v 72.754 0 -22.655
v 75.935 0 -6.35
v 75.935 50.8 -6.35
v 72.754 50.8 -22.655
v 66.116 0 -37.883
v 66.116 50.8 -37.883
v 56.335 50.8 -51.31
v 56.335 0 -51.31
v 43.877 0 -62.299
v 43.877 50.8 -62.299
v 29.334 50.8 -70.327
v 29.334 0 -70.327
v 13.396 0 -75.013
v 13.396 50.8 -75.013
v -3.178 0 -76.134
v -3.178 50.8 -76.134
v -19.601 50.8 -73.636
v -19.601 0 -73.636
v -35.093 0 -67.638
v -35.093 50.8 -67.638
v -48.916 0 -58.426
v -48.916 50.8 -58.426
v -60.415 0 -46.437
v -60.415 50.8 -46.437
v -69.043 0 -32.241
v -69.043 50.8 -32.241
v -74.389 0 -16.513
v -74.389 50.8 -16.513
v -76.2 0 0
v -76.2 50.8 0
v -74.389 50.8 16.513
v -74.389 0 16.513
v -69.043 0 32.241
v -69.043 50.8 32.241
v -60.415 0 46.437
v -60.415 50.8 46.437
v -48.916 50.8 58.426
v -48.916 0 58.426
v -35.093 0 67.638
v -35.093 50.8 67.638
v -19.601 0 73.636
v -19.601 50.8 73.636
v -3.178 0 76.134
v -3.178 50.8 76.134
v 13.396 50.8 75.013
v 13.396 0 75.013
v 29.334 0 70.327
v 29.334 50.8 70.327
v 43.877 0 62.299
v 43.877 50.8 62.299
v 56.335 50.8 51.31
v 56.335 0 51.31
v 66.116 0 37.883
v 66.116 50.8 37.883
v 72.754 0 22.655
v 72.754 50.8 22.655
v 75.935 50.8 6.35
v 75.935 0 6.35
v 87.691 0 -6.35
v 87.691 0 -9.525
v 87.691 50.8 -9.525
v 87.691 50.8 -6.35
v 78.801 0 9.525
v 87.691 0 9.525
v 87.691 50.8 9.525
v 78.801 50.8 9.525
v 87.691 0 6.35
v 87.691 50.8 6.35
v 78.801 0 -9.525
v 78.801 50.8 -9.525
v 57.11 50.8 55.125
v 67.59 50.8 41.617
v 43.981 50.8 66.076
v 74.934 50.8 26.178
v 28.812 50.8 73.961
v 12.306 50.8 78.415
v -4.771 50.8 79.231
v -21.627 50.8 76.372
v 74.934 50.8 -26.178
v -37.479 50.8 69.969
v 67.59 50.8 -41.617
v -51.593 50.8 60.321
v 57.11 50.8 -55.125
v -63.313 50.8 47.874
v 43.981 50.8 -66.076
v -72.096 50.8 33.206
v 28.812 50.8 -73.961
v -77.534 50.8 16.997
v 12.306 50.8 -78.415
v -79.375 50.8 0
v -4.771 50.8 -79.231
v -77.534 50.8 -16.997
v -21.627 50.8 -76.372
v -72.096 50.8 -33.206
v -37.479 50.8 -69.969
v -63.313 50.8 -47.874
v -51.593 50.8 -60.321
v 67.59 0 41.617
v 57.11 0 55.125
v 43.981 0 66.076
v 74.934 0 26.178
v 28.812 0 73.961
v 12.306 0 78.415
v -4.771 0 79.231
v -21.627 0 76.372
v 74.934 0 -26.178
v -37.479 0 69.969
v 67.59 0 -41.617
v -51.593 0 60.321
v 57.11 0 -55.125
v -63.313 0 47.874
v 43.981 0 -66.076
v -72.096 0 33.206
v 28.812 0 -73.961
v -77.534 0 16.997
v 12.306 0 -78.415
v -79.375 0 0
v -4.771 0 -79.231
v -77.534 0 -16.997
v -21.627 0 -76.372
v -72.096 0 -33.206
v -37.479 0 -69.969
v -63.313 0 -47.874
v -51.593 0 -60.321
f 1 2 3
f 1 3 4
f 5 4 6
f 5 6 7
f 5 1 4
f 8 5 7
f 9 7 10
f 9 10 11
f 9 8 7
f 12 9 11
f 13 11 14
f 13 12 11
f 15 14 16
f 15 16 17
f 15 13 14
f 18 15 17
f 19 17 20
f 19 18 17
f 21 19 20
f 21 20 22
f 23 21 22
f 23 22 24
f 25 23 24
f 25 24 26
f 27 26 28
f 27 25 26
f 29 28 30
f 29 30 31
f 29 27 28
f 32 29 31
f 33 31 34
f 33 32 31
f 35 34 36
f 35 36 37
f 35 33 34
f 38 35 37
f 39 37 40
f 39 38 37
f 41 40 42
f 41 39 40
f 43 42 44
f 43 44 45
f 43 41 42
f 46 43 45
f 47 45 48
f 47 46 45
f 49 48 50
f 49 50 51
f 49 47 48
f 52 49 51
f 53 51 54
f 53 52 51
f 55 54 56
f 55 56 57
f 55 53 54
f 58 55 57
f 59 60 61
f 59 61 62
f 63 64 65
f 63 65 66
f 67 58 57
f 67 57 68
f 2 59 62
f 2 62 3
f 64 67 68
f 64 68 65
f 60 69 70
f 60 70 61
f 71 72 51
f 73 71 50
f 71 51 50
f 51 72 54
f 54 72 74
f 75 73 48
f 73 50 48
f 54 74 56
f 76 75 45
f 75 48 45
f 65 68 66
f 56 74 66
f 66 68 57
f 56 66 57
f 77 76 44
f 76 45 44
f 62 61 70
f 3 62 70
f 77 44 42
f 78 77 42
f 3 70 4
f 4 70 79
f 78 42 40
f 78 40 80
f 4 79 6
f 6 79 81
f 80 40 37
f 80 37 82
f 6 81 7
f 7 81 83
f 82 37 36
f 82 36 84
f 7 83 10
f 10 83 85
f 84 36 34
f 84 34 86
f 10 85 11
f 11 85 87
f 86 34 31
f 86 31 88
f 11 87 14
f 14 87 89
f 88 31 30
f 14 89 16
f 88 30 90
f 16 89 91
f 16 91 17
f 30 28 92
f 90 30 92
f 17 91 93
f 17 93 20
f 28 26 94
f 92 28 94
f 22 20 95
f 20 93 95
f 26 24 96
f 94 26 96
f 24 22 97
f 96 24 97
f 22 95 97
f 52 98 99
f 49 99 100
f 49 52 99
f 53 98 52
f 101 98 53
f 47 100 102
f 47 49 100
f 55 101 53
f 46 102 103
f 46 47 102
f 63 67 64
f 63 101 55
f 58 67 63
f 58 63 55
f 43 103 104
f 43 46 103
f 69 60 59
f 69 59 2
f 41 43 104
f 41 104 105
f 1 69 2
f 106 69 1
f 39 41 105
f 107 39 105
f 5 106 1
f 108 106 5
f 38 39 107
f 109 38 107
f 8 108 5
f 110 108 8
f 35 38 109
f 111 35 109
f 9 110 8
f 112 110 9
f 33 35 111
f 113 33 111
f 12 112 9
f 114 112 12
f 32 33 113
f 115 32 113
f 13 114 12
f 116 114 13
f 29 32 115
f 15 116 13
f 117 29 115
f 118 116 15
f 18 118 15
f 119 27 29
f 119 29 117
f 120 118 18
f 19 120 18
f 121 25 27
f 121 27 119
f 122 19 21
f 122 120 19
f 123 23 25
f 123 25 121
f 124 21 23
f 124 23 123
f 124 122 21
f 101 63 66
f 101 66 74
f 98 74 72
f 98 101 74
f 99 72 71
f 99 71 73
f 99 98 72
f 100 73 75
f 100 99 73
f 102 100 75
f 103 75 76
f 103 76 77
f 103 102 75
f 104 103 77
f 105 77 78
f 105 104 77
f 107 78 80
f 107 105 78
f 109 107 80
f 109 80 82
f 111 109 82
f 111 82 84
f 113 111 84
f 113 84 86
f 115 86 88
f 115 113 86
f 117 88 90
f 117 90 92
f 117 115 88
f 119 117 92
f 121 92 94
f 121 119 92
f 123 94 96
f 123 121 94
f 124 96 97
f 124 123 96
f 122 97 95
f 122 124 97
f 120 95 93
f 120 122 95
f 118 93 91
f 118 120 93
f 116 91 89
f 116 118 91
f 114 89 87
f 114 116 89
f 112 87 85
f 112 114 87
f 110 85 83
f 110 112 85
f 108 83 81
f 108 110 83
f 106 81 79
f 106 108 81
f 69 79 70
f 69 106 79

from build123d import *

# Parameters (mm, degrees)
BOSS_EXTRUDE1_DEPTH = 50.8


with BuildPart() as part:
    # Sketch2 → Boss-Extrude1 (new body)
    with BuildSketch(Plane(origin=(0, 0, 0), x_dir=(1, 0, 0), z_dir=(0, 1, 0))):
        with BuildLine():
            Line((78.800950314, -6.35), (87.690950314, -6.35))
            Line((87.690950314, -6.35), (87.690950314, -9.525))
            Line((87.690950314, -9.525), (78.801427652, -9.525))
            ThreePointArc((78.801427652, -9.525), (-79.375, 0), (78.801427652, 9.525))
            Line((78.801427652, 9.525), (87.690950314, 9.525))
            Line((87.690950314, 9.525), (87.690950314, 6.35))
            Line((87.690950314, 6.35), (78.800950314, 6.35))
            Line((78.800950314, 6.35), (75.934955719, 6.35))
            ThreePointArc((75.934955719, 6.35), (-76.2, 0), (75.934955719, -6.35))
            Line((75.934955719, -6.35), (78.800950314, -6.35))
        make_face()
    extrude(amount=BOSS_EXTRUDE1_DEPTH)


solid = part.part
